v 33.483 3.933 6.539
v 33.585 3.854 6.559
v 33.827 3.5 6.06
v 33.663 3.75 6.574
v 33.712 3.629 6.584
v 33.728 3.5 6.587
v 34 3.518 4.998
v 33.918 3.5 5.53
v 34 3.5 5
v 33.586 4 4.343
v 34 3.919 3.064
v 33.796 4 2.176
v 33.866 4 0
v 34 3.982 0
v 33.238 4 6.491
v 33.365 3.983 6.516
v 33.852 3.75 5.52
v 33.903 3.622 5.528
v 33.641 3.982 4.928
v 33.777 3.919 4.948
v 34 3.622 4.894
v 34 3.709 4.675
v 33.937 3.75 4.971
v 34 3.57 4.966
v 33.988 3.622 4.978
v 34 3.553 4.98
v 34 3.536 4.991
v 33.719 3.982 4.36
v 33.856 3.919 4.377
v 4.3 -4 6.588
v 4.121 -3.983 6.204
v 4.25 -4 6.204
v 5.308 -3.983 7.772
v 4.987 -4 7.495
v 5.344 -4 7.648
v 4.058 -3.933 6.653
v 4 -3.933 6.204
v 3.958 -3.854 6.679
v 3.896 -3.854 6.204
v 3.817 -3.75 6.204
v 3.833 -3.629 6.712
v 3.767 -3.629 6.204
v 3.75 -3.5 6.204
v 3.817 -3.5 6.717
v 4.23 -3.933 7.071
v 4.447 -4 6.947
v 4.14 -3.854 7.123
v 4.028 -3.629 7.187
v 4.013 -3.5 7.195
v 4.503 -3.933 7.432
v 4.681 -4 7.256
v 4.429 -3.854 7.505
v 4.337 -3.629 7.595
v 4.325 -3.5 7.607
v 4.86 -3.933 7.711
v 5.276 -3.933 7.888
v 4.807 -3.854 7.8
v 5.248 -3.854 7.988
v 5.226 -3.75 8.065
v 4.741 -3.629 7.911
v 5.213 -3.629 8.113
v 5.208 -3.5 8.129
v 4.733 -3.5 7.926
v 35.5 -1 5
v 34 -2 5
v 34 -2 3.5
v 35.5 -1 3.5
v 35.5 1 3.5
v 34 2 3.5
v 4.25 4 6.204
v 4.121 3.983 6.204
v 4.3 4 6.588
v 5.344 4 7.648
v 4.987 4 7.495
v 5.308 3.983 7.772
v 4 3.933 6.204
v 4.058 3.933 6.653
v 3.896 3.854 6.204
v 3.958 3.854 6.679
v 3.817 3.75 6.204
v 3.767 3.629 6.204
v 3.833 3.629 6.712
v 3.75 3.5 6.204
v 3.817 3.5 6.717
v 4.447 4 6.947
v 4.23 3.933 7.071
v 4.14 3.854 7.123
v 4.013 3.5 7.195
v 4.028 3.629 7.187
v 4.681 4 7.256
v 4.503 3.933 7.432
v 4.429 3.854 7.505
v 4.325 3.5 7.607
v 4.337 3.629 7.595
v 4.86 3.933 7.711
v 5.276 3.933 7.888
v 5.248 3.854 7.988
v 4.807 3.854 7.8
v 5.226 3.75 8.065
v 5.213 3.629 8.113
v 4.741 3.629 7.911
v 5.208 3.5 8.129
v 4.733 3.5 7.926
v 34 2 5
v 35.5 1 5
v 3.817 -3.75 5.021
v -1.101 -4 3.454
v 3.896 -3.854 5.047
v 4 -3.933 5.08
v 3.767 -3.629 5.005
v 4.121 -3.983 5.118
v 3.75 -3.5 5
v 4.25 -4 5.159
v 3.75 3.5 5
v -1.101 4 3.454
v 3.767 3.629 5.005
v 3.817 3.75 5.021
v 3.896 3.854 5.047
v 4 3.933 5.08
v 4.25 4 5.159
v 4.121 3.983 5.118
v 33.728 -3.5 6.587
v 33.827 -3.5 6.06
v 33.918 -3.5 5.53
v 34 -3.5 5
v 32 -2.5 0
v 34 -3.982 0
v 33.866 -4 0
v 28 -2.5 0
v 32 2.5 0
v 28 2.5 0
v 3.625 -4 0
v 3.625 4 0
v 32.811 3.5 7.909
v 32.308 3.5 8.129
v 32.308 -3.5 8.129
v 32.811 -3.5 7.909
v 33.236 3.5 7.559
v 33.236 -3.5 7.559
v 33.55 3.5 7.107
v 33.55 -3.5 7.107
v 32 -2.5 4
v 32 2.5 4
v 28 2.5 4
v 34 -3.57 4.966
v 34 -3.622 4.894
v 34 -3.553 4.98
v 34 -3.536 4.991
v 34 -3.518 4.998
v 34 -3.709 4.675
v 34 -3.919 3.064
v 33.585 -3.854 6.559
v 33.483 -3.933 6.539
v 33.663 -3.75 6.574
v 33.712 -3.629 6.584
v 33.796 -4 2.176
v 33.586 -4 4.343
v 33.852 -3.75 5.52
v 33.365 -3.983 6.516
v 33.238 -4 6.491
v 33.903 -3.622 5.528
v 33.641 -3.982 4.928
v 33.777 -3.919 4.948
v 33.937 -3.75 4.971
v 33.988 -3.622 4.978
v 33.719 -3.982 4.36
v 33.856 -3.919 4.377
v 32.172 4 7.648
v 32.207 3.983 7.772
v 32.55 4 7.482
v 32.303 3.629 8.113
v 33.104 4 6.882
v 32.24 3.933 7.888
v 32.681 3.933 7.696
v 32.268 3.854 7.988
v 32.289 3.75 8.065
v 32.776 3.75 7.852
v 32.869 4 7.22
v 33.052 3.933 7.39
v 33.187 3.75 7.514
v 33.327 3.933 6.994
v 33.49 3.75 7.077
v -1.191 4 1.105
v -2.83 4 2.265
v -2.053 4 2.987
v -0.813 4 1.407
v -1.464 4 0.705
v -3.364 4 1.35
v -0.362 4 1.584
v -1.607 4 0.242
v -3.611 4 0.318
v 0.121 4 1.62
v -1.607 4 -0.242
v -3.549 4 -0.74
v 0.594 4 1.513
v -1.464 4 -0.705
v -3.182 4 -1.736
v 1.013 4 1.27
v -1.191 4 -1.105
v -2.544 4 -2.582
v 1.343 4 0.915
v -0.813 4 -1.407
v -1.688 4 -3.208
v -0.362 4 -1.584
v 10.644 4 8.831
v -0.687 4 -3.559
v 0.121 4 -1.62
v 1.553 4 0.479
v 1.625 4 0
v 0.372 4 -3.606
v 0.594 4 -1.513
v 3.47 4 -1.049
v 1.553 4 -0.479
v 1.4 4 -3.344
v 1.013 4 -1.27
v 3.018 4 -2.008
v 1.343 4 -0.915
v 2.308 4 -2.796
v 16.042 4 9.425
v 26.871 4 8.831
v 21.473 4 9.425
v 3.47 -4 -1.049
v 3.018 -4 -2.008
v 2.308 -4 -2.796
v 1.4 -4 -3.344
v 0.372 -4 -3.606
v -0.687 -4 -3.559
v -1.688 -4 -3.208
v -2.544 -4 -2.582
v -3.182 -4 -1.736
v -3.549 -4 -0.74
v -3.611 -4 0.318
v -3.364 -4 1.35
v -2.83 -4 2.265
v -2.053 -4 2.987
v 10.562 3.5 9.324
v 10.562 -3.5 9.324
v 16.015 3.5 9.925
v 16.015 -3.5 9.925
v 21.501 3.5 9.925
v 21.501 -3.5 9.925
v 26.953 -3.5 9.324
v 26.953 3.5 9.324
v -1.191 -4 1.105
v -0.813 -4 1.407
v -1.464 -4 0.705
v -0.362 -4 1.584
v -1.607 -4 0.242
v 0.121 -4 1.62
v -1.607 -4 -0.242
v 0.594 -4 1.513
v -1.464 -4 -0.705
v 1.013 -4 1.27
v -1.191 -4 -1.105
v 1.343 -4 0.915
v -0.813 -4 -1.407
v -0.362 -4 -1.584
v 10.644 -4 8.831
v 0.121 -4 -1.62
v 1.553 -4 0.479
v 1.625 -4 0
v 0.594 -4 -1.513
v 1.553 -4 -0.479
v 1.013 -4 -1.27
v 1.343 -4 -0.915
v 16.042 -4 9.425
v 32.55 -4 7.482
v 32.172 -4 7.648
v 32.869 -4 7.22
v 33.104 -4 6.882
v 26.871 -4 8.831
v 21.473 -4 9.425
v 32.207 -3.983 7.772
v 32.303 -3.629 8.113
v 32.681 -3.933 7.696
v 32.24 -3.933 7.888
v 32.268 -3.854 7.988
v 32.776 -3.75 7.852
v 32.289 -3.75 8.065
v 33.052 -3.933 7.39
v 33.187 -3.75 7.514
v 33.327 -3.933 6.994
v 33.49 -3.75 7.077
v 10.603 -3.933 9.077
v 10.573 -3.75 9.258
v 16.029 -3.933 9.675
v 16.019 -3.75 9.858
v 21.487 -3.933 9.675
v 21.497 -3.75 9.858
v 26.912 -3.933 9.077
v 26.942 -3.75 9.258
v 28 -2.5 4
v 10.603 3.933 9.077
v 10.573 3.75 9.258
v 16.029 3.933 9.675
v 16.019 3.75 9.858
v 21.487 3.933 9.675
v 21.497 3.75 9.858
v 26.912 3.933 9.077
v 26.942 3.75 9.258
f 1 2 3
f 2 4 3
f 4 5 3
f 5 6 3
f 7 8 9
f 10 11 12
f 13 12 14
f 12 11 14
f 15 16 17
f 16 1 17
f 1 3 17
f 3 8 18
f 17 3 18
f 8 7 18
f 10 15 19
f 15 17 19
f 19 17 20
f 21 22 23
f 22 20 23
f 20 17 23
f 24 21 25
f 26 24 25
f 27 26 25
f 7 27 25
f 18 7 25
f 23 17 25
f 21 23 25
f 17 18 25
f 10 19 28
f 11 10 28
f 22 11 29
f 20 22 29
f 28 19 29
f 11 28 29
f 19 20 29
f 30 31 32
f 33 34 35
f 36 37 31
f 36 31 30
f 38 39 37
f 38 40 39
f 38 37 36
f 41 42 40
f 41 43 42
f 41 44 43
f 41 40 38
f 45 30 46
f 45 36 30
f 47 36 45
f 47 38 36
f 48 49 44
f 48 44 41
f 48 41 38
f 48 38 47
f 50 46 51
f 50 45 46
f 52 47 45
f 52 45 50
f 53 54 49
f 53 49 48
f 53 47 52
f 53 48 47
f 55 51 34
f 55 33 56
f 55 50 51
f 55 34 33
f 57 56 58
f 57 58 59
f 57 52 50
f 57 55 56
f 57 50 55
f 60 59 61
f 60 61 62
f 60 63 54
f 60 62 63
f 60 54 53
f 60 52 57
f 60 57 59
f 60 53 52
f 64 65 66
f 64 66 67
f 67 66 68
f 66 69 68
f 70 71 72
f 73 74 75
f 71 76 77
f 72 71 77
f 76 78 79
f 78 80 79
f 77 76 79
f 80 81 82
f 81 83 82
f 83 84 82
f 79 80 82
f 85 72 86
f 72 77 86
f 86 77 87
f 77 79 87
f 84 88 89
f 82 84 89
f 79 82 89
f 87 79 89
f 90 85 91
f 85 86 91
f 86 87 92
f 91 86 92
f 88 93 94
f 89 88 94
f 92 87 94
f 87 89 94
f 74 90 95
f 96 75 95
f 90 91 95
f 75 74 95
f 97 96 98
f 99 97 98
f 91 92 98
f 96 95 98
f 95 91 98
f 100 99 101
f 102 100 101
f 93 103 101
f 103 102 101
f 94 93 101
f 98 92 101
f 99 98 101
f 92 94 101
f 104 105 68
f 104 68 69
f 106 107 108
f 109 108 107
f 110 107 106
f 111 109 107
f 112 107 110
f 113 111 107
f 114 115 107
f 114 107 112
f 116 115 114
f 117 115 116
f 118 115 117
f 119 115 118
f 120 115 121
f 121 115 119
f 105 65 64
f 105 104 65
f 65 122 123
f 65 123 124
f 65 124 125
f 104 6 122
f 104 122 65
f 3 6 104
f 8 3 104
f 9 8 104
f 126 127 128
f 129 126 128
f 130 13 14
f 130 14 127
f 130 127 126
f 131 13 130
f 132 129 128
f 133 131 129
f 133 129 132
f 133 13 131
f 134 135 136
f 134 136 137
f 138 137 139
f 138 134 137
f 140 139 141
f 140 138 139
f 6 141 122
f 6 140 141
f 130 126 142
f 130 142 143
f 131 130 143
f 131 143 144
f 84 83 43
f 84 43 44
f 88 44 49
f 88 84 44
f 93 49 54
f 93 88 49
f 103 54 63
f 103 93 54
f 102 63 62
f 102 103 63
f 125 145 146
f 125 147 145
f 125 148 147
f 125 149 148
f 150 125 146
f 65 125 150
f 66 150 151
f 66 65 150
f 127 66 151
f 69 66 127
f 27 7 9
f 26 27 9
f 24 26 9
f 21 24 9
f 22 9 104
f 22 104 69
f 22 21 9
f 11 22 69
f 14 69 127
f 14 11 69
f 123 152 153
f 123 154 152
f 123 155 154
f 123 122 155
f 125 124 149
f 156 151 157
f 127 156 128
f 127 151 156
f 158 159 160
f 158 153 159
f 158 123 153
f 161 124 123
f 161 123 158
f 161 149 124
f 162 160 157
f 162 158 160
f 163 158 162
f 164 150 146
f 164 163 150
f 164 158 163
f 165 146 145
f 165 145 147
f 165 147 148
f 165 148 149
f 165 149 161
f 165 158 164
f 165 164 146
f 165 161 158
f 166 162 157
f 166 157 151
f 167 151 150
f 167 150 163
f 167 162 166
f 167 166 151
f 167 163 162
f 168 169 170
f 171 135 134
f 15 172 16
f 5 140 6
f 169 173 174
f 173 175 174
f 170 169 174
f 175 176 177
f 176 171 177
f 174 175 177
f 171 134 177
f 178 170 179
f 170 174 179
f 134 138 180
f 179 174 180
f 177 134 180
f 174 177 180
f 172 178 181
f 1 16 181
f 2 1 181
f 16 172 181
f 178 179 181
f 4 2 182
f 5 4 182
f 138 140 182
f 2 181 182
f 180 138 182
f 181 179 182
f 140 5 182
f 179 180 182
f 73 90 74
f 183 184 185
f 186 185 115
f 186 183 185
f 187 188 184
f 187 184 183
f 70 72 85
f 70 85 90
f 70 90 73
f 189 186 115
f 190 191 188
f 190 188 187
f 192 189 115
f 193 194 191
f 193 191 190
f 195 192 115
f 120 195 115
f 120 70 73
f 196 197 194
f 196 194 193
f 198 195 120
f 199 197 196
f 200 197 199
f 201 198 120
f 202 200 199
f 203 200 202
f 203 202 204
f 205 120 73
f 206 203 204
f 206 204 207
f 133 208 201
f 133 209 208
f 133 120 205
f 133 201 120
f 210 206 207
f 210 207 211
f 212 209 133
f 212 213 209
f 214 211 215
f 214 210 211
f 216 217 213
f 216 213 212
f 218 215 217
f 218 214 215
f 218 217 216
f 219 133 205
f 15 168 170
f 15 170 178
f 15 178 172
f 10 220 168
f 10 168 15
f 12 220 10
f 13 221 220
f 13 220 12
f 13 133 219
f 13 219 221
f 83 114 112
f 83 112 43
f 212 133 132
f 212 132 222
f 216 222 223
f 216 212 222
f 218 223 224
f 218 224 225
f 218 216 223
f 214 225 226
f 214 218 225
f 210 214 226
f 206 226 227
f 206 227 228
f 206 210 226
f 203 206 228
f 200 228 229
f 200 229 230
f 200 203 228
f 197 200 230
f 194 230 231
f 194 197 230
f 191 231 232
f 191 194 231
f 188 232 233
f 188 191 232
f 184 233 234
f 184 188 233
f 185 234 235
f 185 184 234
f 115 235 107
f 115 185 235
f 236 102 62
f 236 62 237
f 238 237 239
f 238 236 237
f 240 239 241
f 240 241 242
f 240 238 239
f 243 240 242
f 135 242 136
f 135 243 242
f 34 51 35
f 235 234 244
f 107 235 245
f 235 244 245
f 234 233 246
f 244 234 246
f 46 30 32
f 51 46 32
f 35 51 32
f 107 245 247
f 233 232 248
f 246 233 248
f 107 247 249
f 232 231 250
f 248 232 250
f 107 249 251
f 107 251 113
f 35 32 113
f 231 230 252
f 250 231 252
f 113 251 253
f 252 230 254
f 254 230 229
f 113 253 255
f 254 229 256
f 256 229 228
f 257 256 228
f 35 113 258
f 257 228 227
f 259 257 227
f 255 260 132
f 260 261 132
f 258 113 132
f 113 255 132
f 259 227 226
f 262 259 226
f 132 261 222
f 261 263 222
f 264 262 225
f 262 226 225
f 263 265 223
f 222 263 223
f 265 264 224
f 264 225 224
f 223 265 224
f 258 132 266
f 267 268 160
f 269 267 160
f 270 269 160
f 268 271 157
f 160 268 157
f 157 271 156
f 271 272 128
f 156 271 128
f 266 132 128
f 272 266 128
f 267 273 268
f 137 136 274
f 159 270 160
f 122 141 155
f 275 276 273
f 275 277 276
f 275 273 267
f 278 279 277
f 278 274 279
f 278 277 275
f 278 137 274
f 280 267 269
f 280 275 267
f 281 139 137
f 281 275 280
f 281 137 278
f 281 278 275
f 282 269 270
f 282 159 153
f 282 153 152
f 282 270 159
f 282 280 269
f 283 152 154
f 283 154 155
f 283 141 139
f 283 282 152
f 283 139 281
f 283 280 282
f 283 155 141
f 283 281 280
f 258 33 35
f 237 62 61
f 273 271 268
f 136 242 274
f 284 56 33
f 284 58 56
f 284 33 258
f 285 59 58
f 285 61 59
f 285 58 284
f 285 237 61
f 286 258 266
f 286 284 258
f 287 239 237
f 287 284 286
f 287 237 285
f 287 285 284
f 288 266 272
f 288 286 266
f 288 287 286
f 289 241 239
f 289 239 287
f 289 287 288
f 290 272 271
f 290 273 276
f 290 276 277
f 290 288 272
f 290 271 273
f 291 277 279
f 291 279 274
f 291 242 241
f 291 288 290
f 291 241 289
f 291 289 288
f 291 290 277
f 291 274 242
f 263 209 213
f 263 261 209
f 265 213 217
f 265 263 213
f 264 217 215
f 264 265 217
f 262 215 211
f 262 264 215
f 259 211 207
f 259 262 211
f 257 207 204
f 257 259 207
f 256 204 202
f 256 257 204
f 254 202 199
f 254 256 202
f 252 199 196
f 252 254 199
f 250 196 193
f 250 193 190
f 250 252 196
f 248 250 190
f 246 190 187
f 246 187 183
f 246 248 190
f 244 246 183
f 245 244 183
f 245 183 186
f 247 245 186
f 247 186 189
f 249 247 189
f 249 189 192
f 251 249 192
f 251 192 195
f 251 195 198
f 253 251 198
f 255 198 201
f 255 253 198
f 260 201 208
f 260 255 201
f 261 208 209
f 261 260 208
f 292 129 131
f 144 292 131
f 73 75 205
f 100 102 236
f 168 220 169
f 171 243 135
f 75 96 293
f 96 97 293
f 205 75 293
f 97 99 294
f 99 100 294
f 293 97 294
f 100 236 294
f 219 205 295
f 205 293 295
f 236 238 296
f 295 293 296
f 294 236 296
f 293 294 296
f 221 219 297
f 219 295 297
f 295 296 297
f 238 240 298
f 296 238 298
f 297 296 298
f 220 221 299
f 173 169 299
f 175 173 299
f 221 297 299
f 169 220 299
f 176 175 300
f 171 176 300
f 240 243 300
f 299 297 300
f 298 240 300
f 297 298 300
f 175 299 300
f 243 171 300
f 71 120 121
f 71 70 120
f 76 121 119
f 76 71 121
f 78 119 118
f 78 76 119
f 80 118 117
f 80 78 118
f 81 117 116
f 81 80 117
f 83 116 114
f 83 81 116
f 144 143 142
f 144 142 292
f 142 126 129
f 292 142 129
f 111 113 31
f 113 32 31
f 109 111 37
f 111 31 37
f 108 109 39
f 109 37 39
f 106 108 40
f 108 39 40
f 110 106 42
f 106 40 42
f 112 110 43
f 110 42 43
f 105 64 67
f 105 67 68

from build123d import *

# Parameters (mm, degrees)
SKETCH1_R           = 1.625
BOSS_EXTRUDE1_DEPTH = 4
BOSS_EXTRUDE2_DEPTH = 1.5
FILLET1_R           = 0.5
SKETCH4_W           = 4
SKETCH4_H           = 5
CUT_EXTRUDE1_DEPTH  = 4


with BuildPart() as part:
    # Sketch1 → Boss-Extrude1 (new, symmetric)
    with BuildSketch(Plane(origin=(0, 0, 0), x_dir=(1, 0, 0), z_dir=(0, 1, 0))):
        with BuildLine():
            Line((34, 0), (3.625, 0))
            ThreePointArc((3.625, 0), (-2.138914072, 2.926716862), (-1.100887775, -3.453790831))
            Line((-1.100887775, -3.453790831), (3.75, -5))
            Line((3.75, -5), (3.75, -6.203874108))
            ThreePointArc((3.75, -6.203874108), (4.15563796, -7.411354826), (5.208009684, -8.12903553))
            ThreePointArc((5.208009684, -8.12903553), (18.757767579, -10), (32.307525473, -8.12903553))
            ThreePointArc((32.307525473, -8.12903553), (33.236223507, -7.559261794), (33.728449863, -6.587235373))
            ThreePointArc((33.728449863, -6.587235373), (33.873522982, -5.795208431), (34, -5))
            Line((34, -5), (34, 0))
        make_face()
        Circle(SKETCH1_R, mode=Mode.SUBTRACT)
    extrude(amount=BOSS_EXTRUDE1_DEPTH, both=True)

    # Sketch3 → Boss-Extrude2 (add)
    with BuildSketch(Plane(origin=(0, 0, 5), x_dir=(-1, 0, 0), z_dir=(0, 0, -1))):
        Polygon((-34, -2), (-35.5, -1), (-35.5, 1), (-34, 2), align=None)
    extrude(amount=BOSS_EXTRUDE2_DEPTH)

    # Fillet1
    fillet1_edges = [part.edges().sort_by_distance(p)[0] for p in [
        (3.75, 4, 5.601937054),
        (4.15563796, 4, 7.411354826),
        (33.873522982, 4, 5.795208431),
        (33.236223507, 4, 7.559261794),
        (3.75, -4, 5.601937054),
        (4.15563796, -4, 7.411354826),
        (33.873522982, -4, 5.795208431),
        (33.236223507, -4, 7.559261794),
        (18.757767579, 4, 10),
        (18.757767579, -4, 10),
    ]]
    fillet(fillet1_edges, radius=FILLET1_R)

    # Sketch4 → Cut-Extrude1 (cut)
    with BuildSketch(Plane(origin=(0, 0, 0), x_dir=(-1, 0, 0), z_dir=(0, 0, -1))):
        with Locations((-30, 0)):
            Rectangle(SKETCH4_W, SKETCH4_H)
    extrude(amount=-CUT_EXTRUDE1_DEPTH, mode=Mode.SUBTRACT)


solid = part.part
